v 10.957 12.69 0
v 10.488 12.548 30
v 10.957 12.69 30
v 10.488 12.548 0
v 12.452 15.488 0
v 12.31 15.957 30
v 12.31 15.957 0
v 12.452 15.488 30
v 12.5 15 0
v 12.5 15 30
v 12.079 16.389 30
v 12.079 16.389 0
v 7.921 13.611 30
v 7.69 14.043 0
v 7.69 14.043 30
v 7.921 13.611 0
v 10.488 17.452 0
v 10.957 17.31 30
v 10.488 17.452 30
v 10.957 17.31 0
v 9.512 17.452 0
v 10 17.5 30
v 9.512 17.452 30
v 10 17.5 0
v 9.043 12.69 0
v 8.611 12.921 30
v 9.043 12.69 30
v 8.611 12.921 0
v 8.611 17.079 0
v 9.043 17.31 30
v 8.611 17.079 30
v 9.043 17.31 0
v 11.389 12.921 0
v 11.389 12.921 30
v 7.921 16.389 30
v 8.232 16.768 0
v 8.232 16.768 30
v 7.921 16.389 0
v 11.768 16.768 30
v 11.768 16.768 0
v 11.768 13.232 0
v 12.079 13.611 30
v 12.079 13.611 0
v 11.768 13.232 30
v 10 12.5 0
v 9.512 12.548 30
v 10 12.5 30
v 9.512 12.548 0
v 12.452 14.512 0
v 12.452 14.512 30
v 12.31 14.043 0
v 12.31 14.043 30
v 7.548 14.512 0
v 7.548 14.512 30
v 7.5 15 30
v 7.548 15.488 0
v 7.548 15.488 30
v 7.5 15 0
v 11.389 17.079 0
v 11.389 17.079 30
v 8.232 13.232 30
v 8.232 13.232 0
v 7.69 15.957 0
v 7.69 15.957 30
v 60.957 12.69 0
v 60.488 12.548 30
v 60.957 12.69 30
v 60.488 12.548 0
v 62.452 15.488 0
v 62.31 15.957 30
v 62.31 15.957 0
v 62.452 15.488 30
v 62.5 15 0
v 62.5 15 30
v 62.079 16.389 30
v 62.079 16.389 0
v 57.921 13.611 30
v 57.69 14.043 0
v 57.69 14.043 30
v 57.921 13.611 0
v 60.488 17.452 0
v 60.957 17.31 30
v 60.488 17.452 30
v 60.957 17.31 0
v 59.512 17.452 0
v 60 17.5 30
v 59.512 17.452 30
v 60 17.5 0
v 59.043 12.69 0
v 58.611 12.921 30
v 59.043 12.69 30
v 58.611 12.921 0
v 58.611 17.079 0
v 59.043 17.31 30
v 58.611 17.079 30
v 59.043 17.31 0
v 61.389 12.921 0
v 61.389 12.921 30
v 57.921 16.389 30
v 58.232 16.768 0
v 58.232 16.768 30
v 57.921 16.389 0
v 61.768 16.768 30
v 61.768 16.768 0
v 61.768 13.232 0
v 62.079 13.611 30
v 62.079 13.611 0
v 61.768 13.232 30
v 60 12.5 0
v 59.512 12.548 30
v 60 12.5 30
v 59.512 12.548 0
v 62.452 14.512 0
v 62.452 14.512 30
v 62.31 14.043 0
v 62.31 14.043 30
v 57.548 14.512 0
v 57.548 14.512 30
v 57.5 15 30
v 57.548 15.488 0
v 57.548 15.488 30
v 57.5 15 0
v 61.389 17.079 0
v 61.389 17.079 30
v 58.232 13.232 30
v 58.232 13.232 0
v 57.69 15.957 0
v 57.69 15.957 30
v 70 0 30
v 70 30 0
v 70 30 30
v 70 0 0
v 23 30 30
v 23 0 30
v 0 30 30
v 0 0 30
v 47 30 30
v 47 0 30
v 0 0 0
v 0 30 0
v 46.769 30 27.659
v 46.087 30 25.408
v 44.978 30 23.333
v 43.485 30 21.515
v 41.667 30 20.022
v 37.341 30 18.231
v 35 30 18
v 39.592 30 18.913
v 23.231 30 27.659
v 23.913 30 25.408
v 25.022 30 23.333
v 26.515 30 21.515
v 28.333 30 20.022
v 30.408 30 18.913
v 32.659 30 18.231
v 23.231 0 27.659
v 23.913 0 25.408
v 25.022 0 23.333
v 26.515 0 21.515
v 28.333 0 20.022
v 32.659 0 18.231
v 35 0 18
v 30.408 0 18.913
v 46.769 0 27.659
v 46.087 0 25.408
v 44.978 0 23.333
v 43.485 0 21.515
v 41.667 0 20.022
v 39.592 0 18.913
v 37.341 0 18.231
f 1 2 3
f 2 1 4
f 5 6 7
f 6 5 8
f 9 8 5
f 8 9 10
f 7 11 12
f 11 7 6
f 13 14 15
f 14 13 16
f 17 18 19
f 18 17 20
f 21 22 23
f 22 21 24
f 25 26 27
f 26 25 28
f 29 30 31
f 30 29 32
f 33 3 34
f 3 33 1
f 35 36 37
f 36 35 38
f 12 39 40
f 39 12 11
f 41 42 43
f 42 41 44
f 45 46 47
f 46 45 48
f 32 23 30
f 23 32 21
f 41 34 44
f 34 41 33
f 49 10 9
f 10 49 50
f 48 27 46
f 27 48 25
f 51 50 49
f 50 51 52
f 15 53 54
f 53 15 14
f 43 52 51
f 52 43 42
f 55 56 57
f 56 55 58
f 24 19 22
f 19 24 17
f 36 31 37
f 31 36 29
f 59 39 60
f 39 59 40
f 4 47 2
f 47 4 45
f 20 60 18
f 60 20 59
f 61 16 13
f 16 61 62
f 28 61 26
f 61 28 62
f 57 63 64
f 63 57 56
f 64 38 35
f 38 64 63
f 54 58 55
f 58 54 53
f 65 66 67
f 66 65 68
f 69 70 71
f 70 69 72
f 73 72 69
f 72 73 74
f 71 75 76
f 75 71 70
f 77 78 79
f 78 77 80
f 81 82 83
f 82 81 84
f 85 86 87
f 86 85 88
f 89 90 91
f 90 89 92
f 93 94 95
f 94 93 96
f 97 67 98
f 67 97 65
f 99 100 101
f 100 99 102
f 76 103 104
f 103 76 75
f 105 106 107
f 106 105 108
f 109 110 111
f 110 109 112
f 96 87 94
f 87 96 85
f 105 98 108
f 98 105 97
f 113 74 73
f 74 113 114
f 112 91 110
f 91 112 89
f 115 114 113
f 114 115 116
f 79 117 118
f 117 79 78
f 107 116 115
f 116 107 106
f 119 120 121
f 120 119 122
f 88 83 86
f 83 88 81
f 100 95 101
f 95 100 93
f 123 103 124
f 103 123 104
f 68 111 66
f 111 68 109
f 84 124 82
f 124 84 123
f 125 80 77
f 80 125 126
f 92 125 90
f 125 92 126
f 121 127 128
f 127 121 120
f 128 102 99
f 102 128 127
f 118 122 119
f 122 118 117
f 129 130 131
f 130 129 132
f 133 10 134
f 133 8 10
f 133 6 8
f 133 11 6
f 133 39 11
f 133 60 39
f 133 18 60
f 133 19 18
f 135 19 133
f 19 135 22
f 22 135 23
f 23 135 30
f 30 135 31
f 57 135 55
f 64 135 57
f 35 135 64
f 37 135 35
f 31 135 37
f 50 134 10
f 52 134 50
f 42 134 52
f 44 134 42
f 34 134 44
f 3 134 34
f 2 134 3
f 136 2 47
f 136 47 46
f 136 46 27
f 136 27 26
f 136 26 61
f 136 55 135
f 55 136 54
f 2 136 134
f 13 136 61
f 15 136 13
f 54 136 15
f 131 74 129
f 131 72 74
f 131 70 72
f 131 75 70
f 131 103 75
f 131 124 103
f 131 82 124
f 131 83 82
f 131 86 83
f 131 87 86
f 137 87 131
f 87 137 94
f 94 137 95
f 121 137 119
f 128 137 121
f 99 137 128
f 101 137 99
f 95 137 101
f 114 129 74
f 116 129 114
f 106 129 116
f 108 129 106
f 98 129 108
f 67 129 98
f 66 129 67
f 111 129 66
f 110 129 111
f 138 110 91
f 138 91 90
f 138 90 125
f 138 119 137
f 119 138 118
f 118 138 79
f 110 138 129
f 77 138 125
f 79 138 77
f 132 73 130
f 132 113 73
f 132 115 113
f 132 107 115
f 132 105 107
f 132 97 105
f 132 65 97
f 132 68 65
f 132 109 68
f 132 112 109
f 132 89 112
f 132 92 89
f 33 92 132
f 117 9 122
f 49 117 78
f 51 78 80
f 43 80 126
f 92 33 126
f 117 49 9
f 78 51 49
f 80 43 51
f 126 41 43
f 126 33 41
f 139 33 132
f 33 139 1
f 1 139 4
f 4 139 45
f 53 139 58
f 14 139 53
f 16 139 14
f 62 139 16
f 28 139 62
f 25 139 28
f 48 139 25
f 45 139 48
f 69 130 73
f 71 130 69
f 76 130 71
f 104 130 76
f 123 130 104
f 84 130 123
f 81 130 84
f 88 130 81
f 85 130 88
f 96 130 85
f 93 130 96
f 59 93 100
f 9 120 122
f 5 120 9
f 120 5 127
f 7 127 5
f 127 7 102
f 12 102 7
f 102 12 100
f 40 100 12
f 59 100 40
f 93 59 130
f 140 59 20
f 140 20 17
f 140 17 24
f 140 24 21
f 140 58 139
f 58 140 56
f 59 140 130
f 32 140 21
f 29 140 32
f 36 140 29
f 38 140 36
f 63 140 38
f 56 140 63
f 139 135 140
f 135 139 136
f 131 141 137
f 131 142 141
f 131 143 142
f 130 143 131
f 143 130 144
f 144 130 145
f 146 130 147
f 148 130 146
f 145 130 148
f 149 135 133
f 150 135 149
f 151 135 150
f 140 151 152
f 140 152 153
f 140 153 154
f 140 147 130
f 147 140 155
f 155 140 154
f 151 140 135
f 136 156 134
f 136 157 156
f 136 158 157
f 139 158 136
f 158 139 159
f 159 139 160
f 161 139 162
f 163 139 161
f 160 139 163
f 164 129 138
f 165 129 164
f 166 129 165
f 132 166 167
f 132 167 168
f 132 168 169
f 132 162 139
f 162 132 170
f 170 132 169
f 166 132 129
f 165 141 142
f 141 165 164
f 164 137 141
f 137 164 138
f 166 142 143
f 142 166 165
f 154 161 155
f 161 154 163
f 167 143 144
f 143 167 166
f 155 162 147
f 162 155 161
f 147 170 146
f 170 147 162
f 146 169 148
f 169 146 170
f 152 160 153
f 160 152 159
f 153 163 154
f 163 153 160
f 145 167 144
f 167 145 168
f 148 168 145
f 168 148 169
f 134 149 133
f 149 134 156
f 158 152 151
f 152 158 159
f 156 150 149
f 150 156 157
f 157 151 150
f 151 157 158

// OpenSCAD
$fn = 32;

// ----------------------------------------------------------------------
// Saddle clamp: plain shaft clamp
// ----------------------------------------------------------------------

// --- parameters (mm) ---
blk_l = 70;               // block length, X
blk_w = 30;               // block width, Y
blk_h = 30;               // block height
clamp_r = 12;             // shaft groove radius
hole_r = 2.5;             // bolt hole radius
hole_m = 10;              // bolt hole margin from the ends

saw_depth = clamp_r + 3;  // saw kerf depth

difference() {
  cube([blk_l, blk_w, blk_h]);
  translate([blk_l / 2, -1, blk_h])
    rotate([-90, 0, 0])
      cylinder(h = blk_w + 2, r = clamp_r);
  for (sx = [0, 1])
    translate([sx ? blk_l - hole_m : hole_m, blk_w / 2, -1])
      cylinder(r = hole_r, h = blk_h + 2);
}
